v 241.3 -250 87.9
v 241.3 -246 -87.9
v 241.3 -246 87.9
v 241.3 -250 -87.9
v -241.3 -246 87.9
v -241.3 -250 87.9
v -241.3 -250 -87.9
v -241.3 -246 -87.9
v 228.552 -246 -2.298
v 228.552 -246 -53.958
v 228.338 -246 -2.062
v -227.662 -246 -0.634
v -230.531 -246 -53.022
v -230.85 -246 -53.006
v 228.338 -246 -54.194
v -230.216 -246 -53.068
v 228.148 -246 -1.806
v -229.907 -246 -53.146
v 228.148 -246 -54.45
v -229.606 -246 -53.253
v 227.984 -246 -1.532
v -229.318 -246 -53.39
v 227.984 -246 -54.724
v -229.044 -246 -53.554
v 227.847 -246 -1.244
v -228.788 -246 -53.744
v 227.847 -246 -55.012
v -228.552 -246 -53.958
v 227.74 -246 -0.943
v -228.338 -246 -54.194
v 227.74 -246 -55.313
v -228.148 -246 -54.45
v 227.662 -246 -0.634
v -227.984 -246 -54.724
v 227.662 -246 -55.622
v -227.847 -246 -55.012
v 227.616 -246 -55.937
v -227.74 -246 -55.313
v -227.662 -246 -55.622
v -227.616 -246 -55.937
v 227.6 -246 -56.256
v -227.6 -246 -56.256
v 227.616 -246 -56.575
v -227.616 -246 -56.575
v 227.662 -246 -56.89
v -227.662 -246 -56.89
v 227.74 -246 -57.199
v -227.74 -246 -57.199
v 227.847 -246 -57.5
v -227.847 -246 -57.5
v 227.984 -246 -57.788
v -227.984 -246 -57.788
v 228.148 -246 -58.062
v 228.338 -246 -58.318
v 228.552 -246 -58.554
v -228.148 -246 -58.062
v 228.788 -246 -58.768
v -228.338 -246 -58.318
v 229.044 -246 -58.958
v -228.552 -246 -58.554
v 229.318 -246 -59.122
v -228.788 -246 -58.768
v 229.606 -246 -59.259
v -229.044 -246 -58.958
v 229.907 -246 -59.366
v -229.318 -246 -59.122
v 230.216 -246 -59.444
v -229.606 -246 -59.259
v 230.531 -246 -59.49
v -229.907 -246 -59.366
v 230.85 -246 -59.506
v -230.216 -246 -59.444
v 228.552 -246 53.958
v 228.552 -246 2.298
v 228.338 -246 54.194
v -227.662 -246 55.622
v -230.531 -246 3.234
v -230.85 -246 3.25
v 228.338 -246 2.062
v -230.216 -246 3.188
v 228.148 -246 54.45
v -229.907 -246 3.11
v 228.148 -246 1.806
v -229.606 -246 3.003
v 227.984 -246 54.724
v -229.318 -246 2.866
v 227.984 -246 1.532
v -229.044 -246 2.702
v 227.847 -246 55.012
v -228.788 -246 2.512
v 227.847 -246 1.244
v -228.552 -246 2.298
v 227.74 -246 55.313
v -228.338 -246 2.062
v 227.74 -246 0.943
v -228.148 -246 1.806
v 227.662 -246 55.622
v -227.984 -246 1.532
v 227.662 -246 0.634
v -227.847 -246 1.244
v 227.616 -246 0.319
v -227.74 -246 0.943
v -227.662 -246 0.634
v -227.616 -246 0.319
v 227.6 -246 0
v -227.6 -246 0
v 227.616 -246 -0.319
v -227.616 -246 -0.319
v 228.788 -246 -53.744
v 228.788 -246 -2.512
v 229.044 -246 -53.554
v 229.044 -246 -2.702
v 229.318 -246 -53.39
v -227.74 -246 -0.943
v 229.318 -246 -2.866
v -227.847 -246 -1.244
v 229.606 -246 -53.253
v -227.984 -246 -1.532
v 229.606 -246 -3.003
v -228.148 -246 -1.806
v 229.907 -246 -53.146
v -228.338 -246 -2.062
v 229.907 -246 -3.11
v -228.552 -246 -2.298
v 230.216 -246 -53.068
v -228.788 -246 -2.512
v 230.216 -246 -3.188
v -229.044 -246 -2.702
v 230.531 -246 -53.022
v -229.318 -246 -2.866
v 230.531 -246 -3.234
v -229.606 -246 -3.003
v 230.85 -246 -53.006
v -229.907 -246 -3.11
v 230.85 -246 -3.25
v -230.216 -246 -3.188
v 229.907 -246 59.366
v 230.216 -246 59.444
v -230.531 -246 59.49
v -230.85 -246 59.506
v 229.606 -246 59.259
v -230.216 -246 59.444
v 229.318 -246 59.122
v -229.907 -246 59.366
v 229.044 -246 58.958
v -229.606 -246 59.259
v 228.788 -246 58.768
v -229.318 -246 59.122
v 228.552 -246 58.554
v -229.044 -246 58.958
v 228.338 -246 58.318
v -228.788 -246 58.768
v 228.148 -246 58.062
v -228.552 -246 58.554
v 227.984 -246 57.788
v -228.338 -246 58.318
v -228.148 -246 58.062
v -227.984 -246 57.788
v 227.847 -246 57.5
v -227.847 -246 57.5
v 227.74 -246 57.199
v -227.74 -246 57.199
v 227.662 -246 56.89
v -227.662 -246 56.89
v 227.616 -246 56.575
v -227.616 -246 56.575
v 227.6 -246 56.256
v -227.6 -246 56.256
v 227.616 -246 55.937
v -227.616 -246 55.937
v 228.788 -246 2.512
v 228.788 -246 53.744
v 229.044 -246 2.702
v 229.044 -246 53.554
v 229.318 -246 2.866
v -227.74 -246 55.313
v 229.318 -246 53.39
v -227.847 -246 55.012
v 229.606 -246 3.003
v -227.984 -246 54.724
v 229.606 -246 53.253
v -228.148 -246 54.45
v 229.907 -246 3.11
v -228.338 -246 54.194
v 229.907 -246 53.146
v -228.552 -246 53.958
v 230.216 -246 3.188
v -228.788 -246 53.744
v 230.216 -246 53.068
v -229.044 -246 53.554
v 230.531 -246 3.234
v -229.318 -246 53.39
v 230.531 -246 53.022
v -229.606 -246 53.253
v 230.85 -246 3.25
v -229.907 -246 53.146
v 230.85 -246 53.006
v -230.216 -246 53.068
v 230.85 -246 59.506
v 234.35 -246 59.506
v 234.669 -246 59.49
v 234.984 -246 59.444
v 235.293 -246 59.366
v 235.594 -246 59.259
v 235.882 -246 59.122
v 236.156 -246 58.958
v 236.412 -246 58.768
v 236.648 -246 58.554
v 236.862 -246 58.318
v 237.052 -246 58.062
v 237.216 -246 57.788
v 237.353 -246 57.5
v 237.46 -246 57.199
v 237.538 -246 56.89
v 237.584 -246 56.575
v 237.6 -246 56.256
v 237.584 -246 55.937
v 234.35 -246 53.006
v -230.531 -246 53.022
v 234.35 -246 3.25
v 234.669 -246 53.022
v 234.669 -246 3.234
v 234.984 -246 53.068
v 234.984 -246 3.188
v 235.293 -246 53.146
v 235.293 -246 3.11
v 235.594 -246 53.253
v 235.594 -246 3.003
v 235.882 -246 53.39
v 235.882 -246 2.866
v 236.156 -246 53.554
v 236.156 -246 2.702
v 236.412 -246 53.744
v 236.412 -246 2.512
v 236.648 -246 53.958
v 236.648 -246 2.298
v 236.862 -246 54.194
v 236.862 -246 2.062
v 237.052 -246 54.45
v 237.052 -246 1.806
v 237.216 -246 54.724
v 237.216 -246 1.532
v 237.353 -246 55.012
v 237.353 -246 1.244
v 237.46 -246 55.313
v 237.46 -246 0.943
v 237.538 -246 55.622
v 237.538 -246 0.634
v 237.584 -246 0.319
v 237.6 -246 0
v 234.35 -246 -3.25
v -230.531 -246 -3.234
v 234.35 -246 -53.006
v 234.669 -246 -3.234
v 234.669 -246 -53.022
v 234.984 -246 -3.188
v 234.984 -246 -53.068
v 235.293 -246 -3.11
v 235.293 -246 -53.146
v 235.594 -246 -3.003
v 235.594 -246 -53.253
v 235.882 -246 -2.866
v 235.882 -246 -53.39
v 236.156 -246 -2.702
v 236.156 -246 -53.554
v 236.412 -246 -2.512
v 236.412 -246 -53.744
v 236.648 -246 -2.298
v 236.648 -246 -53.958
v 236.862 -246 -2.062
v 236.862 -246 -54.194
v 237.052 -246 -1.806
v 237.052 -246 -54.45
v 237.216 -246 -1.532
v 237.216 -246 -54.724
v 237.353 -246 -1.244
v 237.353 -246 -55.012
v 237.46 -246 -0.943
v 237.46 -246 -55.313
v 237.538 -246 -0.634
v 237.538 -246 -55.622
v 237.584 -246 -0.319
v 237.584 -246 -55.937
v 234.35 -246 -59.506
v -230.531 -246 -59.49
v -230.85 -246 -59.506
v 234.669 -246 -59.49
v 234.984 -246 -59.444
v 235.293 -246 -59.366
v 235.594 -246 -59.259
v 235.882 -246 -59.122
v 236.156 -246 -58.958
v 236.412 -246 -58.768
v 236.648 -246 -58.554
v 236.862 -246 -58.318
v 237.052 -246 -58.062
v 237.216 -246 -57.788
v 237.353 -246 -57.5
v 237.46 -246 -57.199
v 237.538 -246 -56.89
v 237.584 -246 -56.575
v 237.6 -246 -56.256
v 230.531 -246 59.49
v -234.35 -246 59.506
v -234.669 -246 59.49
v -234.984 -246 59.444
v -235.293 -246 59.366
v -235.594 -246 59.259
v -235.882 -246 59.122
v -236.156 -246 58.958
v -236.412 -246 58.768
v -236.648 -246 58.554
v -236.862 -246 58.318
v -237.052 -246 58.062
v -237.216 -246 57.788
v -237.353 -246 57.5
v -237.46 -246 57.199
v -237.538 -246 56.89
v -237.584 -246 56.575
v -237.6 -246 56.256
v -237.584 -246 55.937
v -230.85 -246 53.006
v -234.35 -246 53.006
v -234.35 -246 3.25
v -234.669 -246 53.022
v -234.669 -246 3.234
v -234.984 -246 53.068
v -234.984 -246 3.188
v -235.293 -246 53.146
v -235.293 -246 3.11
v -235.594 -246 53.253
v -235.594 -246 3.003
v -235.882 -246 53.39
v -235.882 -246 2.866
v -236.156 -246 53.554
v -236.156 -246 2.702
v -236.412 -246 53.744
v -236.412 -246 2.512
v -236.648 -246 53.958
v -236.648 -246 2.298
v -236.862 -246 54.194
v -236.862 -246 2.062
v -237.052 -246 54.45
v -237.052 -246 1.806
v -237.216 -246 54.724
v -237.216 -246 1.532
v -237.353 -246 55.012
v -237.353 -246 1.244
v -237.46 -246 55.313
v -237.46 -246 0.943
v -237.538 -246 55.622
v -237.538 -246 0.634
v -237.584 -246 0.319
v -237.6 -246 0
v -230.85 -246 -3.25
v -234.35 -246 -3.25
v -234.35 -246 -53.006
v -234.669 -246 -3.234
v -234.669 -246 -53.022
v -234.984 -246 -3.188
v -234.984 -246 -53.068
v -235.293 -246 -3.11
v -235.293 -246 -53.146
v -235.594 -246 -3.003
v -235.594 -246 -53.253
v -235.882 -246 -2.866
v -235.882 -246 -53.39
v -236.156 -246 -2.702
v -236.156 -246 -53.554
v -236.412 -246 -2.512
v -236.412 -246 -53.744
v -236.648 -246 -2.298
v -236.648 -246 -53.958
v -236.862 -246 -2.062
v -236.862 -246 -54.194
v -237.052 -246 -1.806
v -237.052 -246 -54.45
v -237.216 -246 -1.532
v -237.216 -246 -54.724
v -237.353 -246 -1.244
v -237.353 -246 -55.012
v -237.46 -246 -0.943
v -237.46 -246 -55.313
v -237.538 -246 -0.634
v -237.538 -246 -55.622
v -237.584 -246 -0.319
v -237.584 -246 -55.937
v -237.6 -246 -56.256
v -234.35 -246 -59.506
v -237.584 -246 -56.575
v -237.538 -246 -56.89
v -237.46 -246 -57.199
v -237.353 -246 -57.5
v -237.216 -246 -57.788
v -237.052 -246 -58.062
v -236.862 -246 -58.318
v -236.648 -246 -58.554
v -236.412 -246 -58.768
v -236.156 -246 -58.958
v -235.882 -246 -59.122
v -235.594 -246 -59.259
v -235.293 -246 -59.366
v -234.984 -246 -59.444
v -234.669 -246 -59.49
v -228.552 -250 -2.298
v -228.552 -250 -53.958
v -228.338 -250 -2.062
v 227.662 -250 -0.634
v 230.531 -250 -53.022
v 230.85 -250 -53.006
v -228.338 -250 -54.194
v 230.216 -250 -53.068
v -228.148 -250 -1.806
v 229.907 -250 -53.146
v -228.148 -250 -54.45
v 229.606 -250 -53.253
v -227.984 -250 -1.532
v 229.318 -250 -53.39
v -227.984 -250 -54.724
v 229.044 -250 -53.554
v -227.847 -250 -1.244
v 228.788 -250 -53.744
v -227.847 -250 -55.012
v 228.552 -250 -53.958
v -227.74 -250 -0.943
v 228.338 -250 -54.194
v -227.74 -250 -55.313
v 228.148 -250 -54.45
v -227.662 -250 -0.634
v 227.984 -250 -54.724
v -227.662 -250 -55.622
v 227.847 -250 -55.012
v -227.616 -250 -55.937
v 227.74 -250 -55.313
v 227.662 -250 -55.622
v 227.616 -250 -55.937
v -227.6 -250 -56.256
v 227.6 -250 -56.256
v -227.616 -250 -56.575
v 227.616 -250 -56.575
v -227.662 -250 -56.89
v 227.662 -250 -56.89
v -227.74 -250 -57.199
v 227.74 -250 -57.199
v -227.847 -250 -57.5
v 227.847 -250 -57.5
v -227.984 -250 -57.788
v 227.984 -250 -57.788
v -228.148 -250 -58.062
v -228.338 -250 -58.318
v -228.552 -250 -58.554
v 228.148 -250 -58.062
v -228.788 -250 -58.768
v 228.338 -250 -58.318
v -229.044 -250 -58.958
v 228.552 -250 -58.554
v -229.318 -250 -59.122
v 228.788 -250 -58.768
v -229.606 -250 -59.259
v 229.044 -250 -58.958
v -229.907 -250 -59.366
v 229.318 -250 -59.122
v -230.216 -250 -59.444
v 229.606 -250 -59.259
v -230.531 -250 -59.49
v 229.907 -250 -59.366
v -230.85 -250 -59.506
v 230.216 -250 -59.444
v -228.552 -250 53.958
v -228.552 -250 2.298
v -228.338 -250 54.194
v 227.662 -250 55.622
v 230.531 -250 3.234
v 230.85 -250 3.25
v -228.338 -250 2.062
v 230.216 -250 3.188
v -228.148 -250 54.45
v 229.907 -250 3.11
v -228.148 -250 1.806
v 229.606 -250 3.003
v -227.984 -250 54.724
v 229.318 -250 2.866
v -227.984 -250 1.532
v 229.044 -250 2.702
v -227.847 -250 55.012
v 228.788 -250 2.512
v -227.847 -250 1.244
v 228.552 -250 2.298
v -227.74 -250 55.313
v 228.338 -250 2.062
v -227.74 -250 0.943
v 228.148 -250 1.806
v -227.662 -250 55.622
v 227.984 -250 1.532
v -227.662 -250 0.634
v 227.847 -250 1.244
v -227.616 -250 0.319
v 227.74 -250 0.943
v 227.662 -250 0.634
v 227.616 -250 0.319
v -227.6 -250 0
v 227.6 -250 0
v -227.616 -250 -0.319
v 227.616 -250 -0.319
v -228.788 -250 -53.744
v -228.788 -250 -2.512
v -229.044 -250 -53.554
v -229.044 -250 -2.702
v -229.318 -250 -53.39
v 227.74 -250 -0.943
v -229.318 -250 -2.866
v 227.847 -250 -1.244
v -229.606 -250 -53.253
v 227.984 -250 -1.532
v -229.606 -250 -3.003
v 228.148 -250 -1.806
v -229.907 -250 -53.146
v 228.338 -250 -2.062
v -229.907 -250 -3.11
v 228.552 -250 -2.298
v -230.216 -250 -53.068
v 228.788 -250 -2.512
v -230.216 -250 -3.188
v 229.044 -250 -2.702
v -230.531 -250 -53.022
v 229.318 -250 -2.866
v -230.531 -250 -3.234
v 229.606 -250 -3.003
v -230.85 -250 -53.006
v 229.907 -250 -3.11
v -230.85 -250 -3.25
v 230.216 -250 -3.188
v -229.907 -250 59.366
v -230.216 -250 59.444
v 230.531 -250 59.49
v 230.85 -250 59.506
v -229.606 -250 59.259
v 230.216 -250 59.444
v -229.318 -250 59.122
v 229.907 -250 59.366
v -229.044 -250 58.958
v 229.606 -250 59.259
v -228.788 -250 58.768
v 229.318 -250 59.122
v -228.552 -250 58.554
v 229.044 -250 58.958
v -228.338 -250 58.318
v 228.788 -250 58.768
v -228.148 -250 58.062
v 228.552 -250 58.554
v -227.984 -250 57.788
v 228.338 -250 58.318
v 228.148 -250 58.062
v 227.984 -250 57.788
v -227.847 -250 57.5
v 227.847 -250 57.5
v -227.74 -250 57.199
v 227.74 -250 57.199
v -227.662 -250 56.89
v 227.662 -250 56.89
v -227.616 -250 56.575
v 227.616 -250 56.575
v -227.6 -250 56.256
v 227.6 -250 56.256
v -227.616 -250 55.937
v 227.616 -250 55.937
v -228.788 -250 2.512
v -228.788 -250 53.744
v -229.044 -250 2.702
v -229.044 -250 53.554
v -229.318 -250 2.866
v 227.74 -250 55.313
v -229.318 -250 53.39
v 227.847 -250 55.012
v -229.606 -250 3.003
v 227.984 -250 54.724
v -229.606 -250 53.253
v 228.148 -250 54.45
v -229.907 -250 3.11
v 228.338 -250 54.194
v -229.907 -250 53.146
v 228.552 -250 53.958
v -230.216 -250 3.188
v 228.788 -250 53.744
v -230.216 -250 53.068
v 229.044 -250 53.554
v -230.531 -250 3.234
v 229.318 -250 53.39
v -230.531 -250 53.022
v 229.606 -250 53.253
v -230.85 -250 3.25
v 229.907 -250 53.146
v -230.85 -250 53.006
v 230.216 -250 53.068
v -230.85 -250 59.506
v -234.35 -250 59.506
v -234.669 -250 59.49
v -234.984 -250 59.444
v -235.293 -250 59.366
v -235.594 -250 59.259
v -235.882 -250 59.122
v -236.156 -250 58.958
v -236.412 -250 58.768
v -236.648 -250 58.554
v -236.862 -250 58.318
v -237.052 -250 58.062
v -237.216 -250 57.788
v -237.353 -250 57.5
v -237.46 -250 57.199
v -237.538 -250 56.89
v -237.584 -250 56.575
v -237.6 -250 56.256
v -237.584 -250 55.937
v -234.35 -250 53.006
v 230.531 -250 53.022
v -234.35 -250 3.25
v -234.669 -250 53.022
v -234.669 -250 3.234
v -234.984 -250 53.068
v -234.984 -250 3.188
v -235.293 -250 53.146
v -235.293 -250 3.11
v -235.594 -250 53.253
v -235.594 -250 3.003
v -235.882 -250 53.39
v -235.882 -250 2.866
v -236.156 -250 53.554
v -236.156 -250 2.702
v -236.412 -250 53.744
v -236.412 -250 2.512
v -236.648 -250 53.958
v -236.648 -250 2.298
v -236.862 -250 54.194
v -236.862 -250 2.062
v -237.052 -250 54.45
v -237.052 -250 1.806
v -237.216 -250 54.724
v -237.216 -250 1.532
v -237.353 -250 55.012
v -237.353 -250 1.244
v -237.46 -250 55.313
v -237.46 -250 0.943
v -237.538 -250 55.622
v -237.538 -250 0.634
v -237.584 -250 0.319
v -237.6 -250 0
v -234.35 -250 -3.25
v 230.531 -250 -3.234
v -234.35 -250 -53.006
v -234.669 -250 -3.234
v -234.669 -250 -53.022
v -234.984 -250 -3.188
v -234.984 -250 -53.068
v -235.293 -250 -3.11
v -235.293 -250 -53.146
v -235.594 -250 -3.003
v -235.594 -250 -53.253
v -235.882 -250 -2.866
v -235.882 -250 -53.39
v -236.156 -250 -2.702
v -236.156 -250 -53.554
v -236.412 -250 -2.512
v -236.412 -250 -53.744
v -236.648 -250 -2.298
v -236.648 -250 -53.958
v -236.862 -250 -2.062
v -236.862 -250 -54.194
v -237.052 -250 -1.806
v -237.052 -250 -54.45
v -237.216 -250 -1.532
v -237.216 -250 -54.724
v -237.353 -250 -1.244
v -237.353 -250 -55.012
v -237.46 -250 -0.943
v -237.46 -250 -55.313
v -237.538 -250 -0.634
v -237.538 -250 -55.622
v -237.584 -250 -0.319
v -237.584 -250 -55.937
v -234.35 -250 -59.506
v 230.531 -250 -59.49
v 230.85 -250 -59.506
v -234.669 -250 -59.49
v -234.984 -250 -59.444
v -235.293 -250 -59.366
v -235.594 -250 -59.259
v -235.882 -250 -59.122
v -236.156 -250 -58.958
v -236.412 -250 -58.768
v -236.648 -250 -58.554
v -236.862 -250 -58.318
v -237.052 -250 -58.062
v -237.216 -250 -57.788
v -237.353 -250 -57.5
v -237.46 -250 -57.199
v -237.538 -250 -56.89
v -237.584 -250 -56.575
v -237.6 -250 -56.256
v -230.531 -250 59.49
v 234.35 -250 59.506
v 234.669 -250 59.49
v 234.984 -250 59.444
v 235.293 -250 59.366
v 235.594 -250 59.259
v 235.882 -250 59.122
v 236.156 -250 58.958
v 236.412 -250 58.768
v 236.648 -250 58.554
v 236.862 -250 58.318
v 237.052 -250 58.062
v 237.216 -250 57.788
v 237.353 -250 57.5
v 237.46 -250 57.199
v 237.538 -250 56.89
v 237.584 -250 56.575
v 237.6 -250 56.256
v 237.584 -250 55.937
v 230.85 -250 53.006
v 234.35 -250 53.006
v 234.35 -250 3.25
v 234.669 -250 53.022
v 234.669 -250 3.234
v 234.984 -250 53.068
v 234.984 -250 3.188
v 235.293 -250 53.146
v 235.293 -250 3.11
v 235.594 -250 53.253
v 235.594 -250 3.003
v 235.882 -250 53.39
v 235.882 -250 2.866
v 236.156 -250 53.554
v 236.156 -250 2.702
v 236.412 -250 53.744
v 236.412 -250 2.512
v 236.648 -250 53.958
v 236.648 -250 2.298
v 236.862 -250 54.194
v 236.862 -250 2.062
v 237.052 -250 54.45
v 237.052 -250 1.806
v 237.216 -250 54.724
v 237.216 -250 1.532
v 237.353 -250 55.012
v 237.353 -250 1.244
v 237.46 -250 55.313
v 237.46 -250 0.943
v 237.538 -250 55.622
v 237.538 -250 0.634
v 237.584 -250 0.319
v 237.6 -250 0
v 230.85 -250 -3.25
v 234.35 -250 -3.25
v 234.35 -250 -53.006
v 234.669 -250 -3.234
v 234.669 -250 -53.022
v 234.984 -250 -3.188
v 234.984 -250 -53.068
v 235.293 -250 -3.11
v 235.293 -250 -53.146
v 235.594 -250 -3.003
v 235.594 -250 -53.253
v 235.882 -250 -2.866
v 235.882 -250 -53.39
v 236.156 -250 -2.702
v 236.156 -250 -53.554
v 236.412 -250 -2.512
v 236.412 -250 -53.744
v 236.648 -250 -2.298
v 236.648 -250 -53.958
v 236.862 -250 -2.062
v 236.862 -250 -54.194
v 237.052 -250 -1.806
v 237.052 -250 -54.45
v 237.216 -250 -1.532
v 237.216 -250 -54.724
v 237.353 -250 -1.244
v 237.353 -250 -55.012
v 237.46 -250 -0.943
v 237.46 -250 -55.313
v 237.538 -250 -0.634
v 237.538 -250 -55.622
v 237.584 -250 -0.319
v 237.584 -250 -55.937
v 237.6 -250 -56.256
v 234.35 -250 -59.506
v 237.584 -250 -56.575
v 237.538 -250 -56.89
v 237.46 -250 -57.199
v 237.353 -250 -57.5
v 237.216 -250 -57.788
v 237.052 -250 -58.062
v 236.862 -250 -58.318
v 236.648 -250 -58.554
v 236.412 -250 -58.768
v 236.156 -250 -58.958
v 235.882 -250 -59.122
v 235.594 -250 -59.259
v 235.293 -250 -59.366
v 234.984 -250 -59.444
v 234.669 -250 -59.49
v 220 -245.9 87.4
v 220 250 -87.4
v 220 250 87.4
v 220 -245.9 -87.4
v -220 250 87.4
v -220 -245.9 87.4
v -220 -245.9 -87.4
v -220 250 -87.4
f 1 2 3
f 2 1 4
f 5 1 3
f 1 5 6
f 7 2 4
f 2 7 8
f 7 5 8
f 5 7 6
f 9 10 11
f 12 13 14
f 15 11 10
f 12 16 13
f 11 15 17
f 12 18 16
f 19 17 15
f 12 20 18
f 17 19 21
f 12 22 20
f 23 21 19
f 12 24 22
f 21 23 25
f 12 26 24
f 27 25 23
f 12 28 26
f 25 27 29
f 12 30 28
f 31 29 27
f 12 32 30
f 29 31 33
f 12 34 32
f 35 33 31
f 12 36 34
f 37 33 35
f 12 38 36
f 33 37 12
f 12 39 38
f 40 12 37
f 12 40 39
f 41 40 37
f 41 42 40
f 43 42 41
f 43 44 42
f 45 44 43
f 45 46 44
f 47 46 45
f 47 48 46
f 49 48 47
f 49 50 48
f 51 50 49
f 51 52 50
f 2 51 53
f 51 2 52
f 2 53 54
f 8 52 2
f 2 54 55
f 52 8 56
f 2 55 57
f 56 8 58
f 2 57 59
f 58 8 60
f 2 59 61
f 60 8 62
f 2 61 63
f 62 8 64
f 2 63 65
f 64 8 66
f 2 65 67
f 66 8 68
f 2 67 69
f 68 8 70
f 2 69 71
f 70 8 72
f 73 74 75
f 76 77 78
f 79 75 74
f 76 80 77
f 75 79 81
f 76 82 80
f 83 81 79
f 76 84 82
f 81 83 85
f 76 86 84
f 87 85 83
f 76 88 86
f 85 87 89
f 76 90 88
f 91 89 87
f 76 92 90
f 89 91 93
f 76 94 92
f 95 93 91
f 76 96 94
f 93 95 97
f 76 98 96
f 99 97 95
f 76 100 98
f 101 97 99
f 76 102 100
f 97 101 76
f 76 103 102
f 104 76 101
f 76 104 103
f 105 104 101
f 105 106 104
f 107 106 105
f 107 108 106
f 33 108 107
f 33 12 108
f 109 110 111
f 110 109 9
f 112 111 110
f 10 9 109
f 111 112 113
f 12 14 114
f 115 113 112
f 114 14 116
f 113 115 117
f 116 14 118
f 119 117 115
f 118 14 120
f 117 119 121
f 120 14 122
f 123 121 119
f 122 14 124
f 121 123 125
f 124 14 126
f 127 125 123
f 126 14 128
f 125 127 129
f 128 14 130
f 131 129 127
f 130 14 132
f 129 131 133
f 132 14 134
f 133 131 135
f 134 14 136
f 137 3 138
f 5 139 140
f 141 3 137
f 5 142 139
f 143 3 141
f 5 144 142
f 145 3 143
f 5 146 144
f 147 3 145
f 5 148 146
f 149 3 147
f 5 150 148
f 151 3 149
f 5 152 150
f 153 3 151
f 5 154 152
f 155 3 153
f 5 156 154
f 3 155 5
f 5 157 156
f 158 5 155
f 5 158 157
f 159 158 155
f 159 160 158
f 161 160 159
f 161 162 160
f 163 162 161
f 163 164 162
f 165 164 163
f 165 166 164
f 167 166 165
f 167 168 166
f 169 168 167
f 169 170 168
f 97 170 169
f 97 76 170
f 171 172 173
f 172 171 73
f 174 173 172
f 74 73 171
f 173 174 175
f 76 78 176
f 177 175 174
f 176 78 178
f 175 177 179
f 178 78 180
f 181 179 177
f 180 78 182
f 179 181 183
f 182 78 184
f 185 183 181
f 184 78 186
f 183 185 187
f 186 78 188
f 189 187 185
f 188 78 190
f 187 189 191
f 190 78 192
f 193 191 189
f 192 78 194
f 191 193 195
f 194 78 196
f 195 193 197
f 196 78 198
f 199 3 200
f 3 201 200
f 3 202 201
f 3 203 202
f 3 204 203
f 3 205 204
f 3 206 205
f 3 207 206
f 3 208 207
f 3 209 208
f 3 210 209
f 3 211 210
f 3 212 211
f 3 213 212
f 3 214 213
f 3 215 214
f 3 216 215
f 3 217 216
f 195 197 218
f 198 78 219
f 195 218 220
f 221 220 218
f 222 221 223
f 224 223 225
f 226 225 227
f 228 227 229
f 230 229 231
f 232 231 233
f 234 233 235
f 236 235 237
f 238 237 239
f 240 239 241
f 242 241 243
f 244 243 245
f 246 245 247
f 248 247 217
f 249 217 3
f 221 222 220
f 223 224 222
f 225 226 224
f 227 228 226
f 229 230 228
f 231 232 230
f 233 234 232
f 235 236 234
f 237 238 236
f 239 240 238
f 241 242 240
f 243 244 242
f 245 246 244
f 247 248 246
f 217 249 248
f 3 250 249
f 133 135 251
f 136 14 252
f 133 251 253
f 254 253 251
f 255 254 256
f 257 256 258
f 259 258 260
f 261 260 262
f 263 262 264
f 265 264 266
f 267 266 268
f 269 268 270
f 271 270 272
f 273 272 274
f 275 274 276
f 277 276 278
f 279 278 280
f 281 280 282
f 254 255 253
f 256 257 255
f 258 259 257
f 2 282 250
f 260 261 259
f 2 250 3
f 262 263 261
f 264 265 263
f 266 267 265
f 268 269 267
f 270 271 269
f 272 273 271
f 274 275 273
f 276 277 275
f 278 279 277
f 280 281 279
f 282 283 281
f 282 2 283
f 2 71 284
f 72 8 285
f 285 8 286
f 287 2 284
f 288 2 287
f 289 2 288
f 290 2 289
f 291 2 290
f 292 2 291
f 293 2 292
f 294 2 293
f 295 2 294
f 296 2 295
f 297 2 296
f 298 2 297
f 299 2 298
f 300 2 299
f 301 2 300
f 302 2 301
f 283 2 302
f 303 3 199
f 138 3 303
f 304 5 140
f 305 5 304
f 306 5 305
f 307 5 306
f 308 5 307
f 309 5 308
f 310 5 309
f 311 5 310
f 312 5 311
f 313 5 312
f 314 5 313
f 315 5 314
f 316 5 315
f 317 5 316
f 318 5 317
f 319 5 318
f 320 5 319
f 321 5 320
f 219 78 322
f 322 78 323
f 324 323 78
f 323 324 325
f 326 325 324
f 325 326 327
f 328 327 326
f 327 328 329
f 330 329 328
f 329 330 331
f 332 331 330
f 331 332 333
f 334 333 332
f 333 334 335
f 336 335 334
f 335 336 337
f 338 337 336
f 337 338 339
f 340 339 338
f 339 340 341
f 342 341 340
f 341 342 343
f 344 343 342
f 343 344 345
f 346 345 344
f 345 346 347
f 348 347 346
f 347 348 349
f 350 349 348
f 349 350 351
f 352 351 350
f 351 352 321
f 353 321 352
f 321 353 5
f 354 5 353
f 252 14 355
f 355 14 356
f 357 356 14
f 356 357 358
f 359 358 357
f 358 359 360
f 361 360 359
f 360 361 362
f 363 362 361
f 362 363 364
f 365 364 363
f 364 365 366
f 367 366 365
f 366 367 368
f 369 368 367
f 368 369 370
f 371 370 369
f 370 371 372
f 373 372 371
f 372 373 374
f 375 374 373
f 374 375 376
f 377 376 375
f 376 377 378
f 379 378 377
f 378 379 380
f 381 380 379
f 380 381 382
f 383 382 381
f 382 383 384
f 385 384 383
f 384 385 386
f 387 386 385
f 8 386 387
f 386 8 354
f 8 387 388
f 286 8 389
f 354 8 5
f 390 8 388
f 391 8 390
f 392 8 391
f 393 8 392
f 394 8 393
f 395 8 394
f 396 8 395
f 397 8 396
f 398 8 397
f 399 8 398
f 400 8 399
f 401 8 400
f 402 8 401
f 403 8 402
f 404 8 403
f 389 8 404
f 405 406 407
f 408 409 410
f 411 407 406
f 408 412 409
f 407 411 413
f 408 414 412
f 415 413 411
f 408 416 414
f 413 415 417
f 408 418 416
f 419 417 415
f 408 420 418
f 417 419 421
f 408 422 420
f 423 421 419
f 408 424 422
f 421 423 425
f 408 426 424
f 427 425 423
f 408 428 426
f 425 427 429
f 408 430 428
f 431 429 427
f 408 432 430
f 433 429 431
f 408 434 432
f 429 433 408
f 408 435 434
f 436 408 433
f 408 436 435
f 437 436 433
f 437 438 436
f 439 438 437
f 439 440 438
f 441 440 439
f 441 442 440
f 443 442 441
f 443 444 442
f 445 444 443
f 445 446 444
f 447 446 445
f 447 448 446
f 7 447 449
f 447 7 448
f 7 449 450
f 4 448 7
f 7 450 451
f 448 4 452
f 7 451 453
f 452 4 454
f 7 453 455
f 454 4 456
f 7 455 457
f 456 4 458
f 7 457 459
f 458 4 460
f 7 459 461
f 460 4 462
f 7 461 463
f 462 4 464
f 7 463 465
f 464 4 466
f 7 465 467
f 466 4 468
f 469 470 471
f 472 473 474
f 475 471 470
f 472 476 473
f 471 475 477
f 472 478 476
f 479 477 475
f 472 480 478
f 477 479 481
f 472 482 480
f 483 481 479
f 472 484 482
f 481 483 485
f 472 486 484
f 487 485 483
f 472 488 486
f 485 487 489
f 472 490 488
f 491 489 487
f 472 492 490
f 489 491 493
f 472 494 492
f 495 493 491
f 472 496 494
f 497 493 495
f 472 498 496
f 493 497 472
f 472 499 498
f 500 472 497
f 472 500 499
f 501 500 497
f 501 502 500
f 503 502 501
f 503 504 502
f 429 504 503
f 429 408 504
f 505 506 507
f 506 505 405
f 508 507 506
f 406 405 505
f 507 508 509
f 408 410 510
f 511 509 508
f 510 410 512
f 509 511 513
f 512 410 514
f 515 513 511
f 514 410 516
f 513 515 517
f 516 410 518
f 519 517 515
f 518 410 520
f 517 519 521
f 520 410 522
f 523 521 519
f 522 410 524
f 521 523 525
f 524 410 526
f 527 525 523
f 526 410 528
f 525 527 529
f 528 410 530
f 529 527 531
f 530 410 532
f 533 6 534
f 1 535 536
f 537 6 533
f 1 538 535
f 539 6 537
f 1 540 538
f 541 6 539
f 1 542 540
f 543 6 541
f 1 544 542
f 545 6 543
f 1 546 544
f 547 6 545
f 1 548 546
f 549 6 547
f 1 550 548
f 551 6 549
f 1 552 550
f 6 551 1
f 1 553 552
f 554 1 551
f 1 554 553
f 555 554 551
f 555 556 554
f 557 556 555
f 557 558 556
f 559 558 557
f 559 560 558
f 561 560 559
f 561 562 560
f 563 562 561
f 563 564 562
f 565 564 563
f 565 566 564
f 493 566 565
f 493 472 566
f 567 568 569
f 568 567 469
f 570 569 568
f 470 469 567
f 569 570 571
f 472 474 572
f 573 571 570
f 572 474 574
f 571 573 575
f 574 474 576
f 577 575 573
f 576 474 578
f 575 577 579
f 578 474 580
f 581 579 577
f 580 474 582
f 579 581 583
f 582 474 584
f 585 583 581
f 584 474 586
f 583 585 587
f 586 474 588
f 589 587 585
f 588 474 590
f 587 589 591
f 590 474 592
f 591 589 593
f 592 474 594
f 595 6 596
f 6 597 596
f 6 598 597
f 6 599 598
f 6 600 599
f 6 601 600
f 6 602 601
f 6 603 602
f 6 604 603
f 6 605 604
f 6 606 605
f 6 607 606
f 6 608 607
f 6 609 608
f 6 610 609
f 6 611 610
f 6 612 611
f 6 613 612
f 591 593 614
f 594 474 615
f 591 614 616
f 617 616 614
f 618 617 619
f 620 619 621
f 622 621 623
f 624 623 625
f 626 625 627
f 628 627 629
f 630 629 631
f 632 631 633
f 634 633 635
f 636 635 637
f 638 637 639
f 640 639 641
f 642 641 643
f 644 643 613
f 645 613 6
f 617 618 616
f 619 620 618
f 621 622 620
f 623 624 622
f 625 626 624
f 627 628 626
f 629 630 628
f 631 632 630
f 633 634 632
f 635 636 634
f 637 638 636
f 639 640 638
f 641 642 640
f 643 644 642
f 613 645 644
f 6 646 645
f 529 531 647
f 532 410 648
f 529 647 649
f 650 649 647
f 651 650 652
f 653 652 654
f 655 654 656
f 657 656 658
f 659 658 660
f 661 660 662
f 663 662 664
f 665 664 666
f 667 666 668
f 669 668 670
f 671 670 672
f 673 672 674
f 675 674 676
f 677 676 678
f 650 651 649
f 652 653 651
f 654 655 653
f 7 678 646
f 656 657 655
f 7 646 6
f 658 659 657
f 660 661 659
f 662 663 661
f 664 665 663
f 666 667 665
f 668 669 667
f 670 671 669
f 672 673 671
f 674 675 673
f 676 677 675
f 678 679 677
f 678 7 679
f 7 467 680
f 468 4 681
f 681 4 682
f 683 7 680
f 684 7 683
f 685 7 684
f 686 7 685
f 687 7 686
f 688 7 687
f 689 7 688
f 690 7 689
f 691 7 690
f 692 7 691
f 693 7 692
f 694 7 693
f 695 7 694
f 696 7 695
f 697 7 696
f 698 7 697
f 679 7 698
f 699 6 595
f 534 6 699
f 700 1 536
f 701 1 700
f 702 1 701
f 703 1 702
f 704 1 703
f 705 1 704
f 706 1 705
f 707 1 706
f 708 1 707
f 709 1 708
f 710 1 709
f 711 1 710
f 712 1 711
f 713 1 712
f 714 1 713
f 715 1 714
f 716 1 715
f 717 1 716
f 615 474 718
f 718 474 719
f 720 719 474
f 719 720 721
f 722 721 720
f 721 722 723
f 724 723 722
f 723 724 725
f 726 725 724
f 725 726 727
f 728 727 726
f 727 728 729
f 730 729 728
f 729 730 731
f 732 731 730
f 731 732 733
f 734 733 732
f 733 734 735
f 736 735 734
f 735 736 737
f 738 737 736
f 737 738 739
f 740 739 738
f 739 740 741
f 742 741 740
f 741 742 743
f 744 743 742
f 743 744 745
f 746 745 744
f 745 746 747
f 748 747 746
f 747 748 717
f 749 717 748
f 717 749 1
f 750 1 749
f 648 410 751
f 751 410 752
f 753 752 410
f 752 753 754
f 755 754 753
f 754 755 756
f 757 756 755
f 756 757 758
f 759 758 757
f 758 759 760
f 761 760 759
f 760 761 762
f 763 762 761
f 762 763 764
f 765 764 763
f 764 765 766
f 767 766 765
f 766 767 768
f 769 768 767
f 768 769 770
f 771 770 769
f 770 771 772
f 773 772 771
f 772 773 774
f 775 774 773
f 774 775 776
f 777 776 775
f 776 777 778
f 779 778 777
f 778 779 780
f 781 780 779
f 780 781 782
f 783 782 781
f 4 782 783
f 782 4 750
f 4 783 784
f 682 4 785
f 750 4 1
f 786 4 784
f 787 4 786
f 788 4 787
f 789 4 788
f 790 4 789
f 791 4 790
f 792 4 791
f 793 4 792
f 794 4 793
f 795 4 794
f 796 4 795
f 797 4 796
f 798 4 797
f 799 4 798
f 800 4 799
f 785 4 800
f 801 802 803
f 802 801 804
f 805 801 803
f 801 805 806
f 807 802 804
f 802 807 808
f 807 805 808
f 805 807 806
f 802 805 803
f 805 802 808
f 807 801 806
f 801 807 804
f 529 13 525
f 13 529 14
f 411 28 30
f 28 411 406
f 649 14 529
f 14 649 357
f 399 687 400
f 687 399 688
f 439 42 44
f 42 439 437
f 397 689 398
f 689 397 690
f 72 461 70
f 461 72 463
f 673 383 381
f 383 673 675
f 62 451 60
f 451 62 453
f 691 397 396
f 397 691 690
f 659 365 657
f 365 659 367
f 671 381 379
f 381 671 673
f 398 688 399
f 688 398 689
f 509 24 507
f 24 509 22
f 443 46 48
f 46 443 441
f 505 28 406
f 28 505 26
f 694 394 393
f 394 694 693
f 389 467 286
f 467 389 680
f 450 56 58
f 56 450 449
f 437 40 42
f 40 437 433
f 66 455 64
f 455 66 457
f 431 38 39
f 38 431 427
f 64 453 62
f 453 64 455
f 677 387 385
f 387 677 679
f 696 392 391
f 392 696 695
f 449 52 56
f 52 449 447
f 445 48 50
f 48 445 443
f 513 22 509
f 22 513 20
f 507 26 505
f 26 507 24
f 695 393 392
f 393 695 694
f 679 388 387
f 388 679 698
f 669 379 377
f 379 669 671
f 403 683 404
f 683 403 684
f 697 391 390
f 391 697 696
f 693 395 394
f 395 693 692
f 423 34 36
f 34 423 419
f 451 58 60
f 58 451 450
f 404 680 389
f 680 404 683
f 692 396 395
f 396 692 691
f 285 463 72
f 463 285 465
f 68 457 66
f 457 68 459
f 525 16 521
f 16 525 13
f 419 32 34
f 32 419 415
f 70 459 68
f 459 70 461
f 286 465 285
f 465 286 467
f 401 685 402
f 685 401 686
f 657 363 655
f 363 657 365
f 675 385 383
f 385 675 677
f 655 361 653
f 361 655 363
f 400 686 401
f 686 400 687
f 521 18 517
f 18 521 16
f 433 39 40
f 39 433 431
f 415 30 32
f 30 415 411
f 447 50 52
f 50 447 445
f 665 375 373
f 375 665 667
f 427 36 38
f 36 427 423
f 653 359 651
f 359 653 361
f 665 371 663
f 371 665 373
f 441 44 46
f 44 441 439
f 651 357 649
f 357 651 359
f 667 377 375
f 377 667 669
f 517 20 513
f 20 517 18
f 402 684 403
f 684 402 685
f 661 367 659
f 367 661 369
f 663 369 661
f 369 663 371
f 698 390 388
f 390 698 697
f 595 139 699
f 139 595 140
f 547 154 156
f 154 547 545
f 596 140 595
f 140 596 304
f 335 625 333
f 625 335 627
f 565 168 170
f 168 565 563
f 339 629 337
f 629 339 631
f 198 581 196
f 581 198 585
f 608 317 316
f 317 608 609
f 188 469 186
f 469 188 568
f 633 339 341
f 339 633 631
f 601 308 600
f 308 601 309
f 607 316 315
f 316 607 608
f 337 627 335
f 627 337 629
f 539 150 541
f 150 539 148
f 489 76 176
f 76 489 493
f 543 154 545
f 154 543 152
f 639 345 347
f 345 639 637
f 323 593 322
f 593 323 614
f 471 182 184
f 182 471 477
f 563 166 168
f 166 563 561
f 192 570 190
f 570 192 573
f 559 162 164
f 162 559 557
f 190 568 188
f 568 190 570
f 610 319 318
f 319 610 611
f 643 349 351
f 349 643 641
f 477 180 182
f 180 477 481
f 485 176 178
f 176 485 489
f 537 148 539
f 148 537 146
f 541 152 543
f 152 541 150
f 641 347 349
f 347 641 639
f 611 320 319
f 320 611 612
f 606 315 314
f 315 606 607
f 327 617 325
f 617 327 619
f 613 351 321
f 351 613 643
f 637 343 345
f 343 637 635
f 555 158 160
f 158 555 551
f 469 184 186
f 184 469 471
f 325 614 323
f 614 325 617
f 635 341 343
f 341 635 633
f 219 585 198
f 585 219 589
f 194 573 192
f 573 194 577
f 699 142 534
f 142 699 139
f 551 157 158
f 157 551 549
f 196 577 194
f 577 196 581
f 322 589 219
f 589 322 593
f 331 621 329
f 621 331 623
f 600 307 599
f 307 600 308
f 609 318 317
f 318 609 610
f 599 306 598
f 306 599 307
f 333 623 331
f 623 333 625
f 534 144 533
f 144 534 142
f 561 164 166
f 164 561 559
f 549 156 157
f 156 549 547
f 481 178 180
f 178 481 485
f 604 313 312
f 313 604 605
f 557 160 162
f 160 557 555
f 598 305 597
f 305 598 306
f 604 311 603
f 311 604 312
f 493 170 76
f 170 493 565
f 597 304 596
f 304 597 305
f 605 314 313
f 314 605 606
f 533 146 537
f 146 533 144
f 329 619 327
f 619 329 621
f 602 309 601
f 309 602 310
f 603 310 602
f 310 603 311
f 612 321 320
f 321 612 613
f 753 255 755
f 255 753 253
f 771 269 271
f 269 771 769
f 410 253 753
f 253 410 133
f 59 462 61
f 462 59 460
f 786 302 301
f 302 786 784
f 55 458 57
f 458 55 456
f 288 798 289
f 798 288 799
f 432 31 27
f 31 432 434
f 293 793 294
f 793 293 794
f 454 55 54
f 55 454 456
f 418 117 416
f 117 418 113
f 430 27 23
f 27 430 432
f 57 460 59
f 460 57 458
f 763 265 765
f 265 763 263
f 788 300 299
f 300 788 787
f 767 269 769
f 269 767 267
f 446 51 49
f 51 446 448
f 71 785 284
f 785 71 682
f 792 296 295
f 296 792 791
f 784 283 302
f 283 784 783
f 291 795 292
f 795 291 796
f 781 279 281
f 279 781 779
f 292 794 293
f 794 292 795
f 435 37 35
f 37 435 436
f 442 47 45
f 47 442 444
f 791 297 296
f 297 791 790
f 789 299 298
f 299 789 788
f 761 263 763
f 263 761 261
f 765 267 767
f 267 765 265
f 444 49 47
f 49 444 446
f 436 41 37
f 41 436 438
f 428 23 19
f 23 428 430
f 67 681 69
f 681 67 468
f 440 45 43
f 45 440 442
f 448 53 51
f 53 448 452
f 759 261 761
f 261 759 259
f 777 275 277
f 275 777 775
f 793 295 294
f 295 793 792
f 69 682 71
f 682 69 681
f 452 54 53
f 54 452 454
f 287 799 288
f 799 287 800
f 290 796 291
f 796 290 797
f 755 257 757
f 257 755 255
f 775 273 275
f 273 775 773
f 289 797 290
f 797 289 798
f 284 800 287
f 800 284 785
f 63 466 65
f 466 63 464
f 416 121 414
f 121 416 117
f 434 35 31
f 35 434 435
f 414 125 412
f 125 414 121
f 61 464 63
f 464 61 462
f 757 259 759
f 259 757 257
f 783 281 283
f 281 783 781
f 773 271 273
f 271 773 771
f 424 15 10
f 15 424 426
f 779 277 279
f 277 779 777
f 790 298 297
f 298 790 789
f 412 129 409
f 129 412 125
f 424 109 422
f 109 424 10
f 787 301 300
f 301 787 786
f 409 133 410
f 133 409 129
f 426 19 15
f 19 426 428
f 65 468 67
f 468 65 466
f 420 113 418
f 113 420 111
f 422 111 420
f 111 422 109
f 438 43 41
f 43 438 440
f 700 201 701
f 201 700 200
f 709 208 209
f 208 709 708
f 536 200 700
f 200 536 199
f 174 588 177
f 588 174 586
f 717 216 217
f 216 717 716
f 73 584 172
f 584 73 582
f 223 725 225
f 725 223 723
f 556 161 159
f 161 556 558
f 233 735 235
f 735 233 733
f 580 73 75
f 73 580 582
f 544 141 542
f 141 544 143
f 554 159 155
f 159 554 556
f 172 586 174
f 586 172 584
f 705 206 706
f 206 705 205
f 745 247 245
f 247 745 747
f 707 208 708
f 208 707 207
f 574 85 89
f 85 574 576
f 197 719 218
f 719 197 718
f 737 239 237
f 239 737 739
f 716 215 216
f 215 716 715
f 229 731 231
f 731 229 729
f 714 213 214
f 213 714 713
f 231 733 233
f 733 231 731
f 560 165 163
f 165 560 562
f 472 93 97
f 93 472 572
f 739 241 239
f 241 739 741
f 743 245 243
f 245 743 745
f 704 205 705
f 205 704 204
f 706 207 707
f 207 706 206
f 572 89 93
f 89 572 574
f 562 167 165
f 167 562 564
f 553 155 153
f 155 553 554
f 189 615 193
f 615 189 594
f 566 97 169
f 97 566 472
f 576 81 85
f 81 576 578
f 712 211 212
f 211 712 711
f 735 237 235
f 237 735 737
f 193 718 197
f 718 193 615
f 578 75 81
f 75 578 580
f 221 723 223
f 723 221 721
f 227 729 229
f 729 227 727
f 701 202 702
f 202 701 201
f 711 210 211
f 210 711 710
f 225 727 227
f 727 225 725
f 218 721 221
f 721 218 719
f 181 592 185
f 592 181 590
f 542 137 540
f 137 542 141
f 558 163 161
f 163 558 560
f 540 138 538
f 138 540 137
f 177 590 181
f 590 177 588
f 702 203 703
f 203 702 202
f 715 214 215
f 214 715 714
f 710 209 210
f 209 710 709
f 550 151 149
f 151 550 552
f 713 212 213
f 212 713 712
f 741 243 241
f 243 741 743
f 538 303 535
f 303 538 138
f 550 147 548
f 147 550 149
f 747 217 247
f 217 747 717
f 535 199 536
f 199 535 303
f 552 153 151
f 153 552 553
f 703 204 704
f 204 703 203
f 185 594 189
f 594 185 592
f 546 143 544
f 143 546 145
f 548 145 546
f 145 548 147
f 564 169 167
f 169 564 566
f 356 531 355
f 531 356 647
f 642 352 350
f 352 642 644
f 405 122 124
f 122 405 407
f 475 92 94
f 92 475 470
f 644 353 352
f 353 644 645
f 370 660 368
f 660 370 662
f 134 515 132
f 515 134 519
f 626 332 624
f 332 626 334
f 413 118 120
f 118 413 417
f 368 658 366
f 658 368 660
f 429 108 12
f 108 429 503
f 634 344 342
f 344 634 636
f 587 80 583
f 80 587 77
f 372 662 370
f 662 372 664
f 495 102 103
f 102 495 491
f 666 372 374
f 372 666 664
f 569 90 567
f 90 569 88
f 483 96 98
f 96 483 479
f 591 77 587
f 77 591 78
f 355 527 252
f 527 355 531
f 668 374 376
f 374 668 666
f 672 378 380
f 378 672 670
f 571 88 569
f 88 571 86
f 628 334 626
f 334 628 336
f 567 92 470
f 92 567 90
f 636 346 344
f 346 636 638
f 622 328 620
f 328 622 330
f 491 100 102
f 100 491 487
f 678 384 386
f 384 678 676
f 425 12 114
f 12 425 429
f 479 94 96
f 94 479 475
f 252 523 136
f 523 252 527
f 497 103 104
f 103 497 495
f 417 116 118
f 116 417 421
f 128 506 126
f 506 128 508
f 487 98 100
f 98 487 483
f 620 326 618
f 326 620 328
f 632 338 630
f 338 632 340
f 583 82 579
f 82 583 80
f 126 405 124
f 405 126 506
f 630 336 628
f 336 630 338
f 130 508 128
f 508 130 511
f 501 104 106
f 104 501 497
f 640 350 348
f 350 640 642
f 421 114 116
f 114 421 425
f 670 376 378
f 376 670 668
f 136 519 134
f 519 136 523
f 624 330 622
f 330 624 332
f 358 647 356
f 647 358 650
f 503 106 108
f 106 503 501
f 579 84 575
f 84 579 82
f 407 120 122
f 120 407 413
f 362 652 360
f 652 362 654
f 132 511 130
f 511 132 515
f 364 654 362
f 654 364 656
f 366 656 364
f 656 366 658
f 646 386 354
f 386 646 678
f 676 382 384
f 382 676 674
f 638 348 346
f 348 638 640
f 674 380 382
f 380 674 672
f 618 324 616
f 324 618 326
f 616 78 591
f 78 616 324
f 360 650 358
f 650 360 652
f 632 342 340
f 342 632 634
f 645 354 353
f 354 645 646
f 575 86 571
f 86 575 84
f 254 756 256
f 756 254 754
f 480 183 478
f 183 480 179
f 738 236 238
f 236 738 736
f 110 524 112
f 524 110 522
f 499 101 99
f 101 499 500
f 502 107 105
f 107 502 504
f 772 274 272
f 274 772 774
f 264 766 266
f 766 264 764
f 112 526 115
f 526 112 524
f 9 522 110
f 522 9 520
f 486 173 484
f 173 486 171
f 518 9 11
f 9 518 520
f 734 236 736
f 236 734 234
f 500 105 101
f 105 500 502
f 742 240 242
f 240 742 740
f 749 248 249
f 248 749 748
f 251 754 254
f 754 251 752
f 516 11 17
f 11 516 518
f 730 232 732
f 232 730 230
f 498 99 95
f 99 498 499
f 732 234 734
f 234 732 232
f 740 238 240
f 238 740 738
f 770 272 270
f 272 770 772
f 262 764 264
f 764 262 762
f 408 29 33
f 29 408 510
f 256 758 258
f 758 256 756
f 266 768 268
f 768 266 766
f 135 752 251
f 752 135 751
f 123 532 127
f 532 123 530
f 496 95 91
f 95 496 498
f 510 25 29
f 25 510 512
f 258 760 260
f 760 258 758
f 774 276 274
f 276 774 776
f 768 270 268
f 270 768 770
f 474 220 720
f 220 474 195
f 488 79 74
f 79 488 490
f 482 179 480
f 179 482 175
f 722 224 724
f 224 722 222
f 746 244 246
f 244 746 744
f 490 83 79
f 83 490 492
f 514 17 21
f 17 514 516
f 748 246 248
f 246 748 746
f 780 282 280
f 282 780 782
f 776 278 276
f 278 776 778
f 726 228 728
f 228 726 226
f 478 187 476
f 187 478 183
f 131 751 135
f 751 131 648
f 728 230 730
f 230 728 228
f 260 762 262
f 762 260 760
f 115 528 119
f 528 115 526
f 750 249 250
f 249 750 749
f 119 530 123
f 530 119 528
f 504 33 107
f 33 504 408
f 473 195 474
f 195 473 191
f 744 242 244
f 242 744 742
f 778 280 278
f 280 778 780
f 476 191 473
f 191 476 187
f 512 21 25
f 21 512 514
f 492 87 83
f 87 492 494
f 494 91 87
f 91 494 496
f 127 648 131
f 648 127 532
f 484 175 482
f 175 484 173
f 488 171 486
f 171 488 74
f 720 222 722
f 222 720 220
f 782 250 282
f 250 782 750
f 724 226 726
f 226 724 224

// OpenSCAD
// ============================================================================
// Atom Lithography Machine — Parametric OpenSCAD Module (S6.4-01)
// ============================================================================
// part_id           : S6.4-01
// parent_bom_id     : S6.4
// subsystem         : S6
// part_name         : Mikrodalga ESR vektor sinyal ureticileri (10-45 GHz, dusuk faz gurultusu)
// material          : Al 6061
// temp_stage        : 300 K (kabin)
// vacuum_grade      : Atmosfer
// tolerance         : <-120 dBc/Hz
// computed_mass_kg  : 19.89746
// envelope_mm       : 482.600 x 512.050 x 175.800
// design_maturity   : M0_M1_DETAILED_CAD_DESIGN_ONLY
// no_lab_measurement: true
// iec61508_certified: false
// semi_s2_certified : false
// Units: millimeters (mm)
// ============================================================================

$fn = 64;

// Nominal bounding envelope parameters (mm)
bbox_x = 482.6000;
bbox_y = 512.0500;
bbox_z = 175.8000;

// Part-specific parametric dimensions
rack_u = 4;
qty_units = 4;
f_max_ghz = 45.0;

// Interface / port parameters (mm)

module part_S6_4_01() {
  difference() {
    union() {
      // 19" EIA-310 front bezel panel
      translate([0.000, -248.000, 0.000]) cube([482.600, 4.000, 175.800], center=true);
      // Hollow EMI shielded chassis body
      translate([0.000, 2.050, 0.000]) cube([440.000, 495.900, 174.800], center=true);
    }
    // EIA-310 rack ear slot
    translate([-232.600, -248.000, -56.256]) rotate([90.000, 0.000, 0.000]) {
      hull() {
        translate([-1.750, 0, 0]) cylinder(d=6.500, h=6.000, center=true);
        translate([1.750, 0, 0]) cylinder(d=6.500, h=6.000, center=true);
      }
    }
    // EIA-310 rack ear slot
    translate([-232.600, -248.000, 56.256]) rotate([90.000, 0.000, 0.000]) {
      hull() {
        translate([-1.750, 0, 0]) cylinder(d=6.500, h=6.000, center=true);
        translate([1.750, 0, 0]) cylinder(d=6.500, h=6.000, center=true);
      }
    }
    // EIA-310 rack ear slot
    translate([232.600, -248.000, -56.256]) rotate([90.000, 0.000, 0.000]) {
      hull() {
        translate([-1.750, 0, 0]) cylinder(d=6.500, h=6.000, center=true);
        translate([1.750, 0, 0]) cylinder(d=6.500, h=6.000, center=true);
      }
    }
    // EIA-310 rack ear slot
    translate([232.600, -248.000, 56.256]) rotate([90.000, 0.000, 0.000]) {
      hull() {
        translate([-1.750, 0, 0]) cylinder(d=6.500, h=6.000, center=true);
        translate([1.750, 0, 0]) cylinder(d=6.500, h=6.000, center=true);
      }
    }
    // EIA-310 rack ear slot
    translate([-232.600, -248.000, 0.000]) rotate([90.000, 0.000, 0.000]) {
      hull() {
        translate([-1.750, 0, 0]) cylinder(d=6.500, h=6.000, center=true);
        translate([1.750, 0, 0]) cylinder(d=6.500, h=6.000, center=true);
      }
    }
    // EIA-310 rack ear slot
    translate([232.600, -248.000, 0.000]) rotate([90.000, 0.000, 0.000]) {
      hull() {
        translate([-1.750, 0, 0]) cylinder(d=6.500, h=6.000, center=true);
        translate([1.750, 0, 0]) cylinder(d=6.500, h=6.000, center=true);
      }
    }
  }
}

// World assembly mounting transform (global machine frame, mm / deg):
// translate([2100.000, 0.000, 712.300]) rotate([0.000, 0.000, 0.000]) part_S6_4_01();

part_S6_4_01();
